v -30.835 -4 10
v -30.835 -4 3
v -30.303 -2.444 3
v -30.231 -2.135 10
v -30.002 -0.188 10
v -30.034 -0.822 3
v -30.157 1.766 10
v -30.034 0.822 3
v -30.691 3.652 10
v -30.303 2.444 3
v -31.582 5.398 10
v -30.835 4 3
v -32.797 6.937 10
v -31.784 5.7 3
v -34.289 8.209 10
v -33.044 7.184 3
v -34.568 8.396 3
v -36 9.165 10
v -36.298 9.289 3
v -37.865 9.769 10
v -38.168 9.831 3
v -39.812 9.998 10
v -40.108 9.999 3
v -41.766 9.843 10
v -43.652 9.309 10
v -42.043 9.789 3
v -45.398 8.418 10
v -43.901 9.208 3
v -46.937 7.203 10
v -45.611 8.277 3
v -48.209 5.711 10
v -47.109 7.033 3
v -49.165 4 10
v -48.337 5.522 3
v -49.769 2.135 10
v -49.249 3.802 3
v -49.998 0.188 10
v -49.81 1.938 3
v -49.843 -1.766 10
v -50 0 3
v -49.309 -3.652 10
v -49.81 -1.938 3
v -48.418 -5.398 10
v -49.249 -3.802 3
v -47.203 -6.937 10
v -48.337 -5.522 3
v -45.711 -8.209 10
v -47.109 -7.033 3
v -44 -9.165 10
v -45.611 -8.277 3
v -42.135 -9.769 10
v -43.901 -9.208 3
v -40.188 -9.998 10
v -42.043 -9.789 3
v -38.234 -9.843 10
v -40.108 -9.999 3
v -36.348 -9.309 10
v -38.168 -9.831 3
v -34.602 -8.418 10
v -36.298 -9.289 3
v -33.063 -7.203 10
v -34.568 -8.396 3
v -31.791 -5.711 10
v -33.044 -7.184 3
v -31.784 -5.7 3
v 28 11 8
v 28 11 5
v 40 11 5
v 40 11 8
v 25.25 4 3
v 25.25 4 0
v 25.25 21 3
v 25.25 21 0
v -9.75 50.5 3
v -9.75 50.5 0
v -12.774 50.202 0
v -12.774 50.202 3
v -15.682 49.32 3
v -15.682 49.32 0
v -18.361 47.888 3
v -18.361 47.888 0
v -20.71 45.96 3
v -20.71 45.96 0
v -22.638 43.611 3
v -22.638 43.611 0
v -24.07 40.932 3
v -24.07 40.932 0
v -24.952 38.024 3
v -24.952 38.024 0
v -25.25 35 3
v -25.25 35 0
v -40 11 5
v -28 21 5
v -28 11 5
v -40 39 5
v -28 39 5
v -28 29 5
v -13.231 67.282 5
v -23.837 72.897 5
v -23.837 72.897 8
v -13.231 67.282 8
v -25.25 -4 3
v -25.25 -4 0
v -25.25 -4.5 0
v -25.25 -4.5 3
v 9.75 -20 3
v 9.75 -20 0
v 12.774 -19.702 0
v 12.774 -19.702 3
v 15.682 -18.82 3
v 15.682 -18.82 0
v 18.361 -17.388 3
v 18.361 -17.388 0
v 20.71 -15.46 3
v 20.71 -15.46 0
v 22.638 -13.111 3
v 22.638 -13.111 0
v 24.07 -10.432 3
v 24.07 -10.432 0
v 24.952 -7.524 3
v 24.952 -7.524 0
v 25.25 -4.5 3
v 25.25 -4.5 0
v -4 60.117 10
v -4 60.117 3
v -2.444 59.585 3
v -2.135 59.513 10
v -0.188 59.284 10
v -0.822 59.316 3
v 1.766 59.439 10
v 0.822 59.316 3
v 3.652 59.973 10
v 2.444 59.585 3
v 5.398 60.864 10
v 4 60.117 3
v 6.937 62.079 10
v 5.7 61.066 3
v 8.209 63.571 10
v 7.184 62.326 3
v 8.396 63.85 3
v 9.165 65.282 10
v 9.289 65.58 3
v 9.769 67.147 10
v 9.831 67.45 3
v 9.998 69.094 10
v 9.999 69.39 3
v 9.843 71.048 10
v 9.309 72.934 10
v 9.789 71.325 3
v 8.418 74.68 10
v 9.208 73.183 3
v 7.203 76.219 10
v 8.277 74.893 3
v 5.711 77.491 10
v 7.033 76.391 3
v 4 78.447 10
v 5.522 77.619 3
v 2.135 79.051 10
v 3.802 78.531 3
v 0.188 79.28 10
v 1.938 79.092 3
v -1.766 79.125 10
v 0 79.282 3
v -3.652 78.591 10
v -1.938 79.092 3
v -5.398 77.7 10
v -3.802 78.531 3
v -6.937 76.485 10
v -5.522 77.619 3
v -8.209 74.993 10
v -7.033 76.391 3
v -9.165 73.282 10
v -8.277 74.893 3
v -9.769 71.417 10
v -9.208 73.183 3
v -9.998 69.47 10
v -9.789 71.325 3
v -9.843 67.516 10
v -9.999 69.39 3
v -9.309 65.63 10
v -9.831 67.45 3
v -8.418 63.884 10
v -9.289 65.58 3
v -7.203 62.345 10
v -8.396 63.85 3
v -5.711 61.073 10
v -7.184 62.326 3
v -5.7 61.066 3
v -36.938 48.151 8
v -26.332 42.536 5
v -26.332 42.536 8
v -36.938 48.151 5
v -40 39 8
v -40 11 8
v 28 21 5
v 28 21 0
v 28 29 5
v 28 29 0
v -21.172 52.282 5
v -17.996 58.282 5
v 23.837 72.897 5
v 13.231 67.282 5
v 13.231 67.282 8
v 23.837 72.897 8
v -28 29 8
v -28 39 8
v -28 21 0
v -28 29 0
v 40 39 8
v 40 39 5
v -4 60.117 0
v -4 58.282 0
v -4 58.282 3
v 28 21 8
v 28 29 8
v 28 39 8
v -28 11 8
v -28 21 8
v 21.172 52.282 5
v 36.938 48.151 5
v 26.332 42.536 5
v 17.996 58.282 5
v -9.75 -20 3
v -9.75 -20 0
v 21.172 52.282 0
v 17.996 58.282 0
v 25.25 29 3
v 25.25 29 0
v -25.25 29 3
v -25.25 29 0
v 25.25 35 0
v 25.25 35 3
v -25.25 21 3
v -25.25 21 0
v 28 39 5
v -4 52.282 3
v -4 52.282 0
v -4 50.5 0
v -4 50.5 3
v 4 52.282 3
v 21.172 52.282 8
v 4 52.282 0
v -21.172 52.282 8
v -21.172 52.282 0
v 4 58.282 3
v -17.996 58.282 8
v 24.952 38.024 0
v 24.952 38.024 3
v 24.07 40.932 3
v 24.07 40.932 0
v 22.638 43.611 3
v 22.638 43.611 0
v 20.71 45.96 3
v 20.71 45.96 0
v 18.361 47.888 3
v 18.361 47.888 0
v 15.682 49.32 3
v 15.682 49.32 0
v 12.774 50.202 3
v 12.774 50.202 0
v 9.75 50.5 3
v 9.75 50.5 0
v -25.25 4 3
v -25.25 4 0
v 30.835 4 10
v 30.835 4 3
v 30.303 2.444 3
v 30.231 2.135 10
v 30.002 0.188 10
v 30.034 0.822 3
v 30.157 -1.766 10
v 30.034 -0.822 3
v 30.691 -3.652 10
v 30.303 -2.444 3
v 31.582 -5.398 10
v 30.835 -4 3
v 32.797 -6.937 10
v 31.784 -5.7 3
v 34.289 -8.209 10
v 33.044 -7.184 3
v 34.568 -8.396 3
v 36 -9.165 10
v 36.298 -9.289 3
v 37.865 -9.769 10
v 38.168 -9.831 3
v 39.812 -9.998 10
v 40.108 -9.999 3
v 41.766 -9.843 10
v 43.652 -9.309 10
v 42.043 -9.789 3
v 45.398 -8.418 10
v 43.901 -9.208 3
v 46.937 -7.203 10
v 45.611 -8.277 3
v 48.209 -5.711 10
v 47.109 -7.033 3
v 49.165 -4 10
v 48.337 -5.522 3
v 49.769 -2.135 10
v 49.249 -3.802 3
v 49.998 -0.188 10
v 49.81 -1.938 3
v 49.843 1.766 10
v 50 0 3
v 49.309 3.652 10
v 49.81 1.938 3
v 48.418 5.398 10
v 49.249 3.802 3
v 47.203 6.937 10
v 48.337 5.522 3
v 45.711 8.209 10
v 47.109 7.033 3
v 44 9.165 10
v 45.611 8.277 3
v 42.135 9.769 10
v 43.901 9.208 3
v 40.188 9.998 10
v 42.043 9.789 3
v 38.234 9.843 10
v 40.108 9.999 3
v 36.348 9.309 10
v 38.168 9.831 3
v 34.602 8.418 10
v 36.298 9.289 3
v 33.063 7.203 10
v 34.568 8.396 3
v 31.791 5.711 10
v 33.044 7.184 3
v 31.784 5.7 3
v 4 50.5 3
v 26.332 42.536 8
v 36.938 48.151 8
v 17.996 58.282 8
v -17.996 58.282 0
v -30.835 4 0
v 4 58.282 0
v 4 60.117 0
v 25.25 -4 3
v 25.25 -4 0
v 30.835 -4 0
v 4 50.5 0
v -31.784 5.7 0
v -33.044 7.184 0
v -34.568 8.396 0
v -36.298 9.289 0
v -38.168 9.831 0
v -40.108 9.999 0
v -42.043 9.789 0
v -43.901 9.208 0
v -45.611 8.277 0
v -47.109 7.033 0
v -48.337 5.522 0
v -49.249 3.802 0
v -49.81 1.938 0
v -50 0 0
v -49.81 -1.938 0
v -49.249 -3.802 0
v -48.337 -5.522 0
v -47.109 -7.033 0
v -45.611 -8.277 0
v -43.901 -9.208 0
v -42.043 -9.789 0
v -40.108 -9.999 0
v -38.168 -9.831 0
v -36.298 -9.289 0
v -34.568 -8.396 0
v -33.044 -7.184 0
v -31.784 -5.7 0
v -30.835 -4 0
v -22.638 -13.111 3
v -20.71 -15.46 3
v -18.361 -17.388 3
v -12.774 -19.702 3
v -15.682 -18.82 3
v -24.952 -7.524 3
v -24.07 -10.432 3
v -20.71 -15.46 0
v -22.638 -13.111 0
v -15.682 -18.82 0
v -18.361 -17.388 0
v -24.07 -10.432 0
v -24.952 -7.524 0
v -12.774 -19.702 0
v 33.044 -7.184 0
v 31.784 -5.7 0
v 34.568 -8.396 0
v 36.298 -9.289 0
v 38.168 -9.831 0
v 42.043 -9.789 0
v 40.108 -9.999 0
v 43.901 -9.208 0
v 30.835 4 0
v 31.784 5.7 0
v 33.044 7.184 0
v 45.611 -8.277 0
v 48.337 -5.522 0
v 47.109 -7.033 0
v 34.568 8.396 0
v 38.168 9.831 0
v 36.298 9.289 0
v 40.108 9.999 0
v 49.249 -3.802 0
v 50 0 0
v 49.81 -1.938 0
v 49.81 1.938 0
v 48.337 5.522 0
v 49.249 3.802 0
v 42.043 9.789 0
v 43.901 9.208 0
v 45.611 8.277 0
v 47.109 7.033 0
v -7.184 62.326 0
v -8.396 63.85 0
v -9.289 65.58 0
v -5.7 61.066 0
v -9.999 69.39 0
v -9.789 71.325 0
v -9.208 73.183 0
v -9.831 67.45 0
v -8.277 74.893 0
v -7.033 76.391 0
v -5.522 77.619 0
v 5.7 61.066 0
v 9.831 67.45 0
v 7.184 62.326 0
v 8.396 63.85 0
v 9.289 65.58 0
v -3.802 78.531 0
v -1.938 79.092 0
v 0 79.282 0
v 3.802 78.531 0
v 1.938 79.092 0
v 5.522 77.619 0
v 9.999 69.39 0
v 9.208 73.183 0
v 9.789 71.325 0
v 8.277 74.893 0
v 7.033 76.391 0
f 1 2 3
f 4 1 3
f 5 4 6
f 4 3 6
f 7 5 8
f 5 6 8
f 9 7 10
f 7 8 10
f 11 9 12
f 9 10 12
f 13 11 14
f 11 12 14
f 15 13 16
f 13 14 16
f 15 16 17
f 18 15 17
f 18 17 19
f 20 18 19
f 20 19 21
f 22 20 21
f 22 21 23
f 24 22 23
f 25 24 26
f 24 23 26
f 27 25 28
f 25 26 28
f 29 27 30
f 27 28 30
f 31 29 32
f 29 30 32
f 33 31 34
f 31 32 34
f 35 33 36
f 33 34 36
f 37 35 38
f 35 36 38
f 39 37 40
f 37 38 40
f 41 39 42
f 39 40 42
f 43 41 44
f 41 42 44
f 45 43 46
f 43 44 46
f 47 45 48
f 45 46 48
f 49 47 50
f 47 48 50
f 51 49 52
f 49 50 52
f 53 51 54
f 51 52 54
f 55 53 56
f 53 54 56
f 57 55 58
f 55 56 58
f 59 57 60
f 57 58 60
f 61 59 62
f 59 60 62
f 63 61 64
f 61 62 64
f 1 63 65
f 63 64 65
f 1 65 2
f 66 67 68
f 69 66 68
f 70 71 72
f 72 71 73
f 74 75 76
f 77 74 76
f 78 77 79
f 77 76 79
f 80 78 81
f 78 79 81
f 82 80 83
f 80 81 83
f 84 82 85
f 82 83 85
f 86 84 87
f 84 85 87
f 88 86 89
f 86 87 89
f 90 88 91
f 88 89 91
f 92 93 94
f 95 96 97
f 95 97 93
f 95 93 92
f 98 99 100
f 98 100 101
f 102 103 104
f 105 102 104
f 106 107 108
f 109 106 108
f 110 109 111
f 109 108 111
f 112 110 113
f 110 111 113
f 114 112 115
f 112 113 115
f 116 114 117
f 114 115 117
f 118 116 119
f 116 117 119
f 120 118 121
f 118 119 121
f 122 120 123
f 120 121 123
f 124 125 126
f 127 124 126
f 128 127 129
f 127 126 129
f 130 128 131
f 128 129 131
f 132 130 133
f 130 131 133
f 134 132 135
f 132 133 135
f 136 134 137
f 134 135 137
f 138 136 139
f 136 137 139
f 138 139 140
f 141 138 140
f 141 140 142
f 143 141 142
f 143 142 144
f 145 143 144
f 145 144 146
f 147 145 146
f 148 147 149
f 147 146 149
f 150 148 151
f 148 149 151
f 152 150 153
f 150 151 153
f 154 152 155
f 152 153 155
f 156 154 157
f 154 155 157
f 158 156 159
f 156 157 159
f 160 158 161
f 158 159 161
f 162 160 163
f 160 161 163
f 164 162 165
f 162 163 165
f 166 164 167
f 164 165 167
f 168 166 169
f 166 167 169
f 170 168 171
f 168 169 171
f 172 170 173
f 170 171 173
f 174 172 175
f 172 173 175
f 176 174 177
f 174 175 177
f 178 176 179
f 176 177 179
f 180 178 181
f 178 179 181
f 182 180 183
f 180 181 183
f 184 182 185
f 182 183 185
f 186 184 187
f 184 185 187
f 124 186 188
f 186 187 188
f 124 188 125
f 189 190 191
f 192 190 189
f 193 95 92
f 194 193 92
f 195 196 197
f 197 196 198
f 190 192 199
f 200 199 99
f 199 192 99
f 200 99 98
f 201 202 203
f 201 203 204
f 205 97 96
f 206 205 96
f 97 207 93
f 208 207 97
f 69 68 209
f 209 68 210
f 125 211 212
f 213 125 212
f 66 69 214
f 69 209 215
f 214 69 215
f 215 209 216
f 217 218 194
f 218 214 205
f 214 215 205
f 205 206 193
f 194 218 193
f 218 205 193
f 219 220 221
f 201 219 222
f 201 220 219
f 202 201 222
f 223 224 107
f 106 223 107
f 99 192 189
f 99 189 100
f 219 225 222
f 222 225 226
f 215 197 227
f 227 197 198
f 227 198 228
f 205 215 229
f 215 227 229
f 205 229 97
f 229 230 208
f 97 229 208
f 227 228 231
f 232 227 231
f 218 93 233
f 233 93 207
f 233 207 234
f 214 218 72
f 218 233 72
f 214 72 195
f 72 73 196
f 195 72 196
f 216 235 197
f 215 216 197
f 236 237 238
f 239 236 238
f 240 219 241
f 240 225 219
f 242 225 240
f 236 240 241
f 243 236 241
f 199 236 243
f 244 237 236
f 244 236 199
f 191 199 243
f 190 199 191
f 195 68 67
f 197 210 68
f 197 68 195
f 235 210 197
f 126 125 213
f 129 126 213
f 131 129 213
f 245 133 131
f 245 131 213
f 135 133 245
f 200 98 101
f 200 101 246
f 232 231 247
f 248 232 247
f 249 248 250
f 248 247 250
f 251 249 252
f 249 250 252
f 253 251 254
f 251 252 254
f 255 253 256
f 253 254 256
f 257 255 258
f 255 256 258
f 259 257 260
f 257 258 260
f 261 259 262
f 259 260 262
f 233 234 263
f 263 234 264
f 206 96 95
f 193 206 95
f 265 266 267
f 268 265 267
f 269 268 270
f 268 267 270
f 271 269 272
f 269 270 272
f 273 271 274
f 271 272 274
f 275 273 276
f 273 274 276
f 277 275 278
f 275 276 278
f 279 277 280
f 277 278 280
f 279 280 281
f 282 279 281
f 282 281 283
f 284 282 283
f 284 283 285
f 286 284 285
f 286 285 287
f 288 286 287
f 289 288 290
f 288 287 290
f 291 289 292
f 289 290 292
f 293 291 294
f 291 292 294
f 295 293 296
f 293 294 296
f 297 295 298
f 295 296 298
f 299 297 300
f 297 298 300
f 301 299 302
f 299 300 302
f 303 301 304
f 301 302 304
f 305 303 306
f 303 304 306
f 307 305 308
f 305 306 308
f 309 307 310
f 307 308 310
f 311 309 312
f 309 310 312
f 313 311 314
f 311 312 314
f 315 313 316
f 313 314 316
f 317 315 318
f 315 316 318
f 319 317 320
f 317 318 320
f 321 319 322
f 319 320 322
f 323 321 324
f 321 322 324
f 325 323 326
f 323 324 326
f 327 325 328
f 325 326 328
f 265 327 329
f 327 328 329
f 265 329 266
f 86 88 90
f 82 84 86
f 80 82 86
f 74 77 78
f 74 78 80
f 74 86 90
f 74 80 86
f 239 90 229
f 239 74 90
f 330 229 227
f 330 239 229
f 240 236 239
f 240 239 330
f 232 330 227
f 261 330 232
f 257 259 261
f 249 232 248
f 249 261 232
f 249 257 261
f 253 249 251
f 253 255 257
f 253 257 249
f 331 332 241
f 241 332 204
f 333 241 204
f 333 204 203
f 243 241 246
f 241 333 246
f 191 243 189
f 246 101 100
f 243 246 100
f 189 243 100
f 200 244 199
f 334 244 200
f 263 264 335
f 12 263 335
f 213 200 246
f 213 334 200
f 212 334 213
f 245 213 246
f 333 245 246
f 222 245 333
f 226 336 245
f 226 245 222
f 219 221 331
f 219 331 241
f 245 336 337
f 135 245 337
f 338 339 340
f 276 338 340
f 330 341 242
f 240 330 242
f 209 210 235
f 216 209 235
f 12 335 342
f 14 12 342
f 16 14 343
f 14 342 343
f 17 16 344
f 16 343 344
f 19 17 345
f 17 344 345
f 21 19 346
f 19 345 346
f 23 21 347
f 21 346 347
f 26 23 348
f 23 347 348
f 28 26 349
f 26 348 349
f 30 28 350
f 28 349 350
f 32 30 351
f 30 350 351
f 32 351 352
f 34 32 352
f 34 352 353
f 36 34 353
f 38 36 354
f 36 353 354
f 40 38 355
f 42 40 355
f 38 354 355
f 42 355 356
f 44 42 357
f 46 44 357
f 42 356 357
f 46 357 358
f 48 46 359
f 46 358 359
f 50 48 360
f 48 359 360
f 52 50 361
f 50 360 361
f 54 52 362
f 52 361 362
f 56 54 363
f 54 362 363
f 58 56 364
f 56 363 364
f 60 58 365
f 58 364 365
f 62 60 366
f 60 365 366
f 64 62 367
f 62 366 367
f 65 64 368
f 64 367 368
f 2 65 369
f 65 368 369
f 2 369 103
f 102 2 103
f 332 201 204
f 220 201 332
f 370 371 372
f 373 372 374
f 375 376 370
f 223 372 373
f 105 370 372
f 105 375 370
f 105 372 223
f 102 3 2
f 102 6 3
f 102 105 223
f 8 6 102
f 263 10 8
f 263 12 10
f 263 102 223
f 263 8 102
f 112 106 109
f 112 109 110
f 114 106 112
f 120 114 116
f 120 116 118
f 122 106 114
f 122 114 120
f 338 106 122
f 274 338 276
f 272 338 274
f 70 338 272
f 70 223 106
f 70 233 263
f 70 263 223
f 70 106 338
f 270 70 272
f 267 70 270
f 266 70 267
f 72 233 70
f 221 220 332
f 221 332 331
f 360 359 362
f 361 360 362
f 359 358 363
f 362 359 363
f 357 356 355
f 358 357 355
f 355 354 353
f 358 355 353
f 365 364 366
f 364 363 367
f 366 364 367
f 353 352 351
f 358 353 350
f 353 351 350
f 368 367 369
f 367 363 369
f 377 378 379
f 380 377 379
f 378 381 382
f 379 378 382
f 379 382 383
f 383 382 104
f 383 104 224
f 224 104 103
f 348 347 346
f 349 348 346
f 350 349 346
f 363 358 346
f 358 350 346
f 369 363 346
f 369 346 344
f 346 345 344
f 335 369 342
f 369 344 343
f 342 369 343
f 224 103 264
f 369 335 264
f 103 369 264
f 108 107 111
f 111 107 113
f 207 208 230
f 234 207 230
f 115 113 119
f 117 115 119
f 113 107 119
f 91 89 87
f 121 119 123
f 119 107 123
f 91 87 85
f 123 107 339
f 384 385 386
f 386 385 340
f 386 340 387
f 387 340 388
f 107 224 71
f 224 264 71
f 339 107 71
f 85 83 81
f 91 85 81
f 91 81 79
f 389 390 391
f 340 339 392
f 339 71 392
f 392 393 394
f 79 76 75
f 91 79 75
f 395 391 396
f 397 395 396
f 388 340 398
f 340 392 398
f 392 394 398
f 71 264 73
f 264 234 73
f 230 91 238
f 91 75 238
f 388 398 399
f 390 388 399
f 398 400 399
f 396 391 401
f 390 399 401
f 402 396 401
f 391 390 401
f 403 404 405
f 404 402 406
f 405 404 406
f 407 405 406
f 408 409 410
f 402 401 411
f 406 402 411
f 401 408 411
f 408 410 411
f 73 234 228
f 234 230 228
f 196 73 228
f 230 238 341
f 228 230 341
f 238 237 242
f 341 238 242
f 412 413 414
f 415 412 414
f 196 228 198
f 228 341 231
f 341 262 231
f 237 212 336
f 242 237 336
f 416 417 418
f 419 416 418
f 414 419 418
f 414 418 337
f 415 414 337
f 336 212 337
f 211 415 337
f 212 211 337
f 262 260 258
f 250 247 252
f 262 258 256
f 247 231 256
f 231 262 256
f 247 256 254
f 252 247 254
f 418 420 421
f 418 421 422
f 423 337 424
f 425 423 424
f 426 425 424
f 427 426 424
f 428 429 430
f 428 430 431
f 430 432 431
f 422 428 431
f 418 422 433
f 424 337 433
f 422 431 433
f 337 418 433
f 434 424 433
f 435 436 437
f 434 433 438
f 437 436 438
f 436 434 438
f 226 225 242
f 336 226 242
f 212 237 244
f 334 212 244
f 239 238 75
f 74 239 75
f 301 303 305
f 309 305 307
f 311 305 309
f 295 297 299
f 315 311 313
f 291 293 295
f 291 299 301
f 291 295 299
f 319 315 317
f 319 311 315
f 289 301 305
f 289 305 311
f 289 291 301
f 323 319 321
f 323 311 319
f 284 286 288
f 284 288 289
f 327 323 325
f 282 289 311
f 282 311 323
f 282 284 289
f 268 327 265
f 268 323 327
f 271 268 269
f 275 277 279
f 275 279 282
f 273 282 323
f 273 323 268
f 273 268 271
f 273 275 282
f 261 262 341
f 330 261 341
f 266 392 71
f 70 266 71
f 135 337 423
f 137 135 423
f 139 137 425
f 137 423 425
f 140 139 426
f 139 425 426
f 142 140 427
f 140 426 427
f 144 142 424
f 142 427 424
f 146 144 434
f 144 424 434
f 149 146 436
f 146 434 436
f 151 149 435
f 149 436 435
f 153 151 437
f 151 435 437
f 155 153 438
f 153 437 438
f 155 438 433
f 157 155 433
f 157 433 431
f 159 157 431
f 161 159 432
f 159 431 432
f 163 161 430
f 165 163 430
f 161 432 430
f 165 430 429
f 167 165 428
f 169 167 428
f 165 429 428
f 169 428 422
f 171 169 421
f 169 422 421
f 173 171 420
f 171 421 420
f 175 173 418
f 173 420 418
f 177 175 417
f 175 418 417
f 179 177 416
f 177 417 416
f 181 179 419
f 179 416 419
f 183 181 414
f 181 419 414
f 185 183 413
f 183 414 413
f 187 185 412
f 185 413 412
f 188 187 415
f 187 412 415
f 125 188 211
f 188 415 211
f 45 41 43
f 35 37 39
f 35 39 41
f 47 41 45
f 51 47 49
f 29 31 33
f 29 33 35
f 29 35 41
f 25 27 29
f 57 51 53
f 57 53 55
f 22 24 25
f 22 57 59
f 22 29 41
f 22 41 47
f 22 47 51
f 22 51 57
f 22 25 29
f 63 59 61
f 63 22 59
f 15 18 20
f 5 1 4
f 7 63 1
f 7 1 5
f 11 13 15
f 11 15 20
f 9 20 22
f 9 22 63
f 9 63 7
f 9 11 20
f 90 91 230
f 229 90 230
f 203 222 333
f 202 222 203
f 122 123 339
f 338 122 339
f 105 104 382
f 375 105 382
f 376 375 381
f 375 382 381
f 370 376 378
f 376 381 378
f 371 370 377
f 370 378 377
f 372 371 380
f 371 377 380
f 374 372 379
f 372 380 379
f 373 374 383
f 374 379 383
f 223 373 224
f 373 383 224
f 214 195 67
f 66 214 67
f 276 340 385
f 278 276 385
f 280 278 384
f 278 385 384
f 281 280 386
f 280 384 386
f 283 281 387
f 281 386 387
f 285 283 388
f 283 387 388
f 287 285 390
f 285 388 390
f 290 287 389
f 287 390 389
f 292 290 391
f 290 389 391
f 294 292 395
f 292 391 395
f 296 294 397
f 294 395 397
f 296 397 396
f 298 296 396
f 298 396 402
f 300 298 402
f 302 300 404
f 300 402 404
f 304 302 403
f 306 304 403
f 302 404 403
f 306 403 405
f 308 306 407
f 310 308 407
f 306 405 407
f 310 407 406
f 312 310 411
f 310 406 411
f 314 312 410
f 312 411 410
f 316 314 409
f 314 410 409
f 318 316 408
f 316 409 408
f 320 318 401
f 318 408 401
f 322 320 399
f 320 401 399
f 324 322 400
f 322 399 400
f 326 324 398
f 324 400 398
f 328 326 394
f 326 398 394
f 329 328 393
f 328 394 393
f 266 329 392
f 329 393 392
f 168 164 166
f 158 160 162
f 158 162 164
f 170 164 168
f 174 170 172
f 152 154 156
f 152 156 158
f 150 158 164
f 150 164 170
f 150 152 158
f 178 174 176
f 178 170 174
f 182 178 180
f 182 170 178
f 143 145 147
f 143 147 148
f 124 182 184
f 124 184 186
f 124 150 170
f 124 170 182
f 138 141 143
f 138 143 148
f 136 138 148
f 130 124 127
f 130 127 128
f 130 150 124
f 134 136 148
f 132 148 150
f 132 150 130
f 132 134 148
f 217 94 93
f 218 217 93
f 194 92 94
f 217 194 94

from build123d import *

# Parameters (mm, degrees)
BOSS_EXTRU_1_DEPTH      = 3
ESQUISSE2_R             = 10
BOSS_EXTRU_2_DEPTH      = 7
BOSS_EXTRU_3_DEPTH      = 5
ESQUISSE4_W             = 12
ESQUISSE4_H             = 28
ENL_V_MAT_EXTRU_1_DEPTH = 5


# Read off the part's stored shape, not the designer's step: Boss.-Extru.1
with BuildPart() as part:
    # Boss.-Extru.1 outline → Boss.-Extru.1 (new body)
    with BuildSketch(Plane.XY):
        with BuildLine():
            ThreePointArc((-25.25, -4.5), (-20.710155108, -15.460155108), (-9.75, -20))
            Line((-9.75, -20), (9.75, -20))
            ThreePointArc((9.75, -20), (20.710155108, -15.460155108), (25.25, -4.5))
            Line((25.25, -4.5), (25.25, -4))
            Line((25.25, -4), (30.83484861, -4))
            ThreePointArc((30.83484861, -4), (50, 0), (30.83484861, 4))
            Line((30.83484861, 4), (25.25, 4))
            Line((25.25, 4), (25.25, 21))
            Line((25.25, 21), (28, 21))
            Line((28, 21), (28, 11))
            Line((28, 11), (40, 11))
            Line((40, 11), (40, 39))
            Line((40, 39), (28, 39))
            Line((28, 39), (28, 29))
            Line((28, 29), (25.25, 29))
            Line((25.25, 29), (25.25, 35))
            ThreePointArc((25.25, 35), (20.710155108, 45.960155108), (9.75, 50.5))
            Line((9.75, 50.5), (4, 50.5))
            Line((4, 50.5), (4, 52.282032303))
            Line((4, 52.282032303), (21.172408726, 52.282032303))
            Line((21.172408726, 52.282032303), (26.332088428, 42.535970645))
            Line((26.332088428, 42.535970645), (36.937543424, 48.15062329))
            Line((36.937543424, 48.15062329), (23.836687252, 72.896684948))
            Line((23.836687252, 72.896684948), (13.231232256, 67.282032303))
            Line((13.231232256, 67.282032303), (17.995938138, 58.282032303))
            Line((17.995938138, 58.282032303), (4, 58.282032303))
            Line((4, 58.282032303), (4, 60.116880913))
            ThreePointArc((4, 60.116880913), (0, 79.282032303), (-4, 60.116880913))
            Line((-4, 60.116880913), (-4, 58.282032303))
            Line((-4, 58.282032303), (-17.995938138, 58.282032303))
            Line((-17.995938138, 58.282032303), (-13.231232256, 67.282032303))
            Line((-13.231232256, 67.282032303), (-23.836687252, 72.896684948))
            Line((-23.836687252, 72.896684948), (-36.937543424, 48.15062329))
            Line((-36.937543424, 48.15062329), (-26.332088428, 42.535970645))
            Line((-26.332088428, 42.535970645), (-21.172408726, 52.282032303))
            Line((-21.172408726, 52.282032303), (-4, 52.282032303))
            Line((-4, 52.282032303), (-4, 50.5))
            Line((-4, 50.5), (-9.75, 50.5))
            ThreePointArc((-9.75, 50.5), (-20.710155108, 45.960155108), (-25.25, 35))
            Line((-25.25, 35), (-25.25, 29))
            Line((-25.25, 29), (-28, 29))
            Line((-28, 29), (-28, 39))
            Line((-28, 39), (-40, 39))
            Line((-40, 39), (-40, 11))
            Line((-40, 11), (-28, 11))
            Line((-28, 11), (-28, 21))
            Line((-28, 21), (-25.25, 21))
            Line((-25.25, 21), (-25.25, 4))
            Line((-25.25, 4), (-30.83484861, 4))
            ThreePointArc((-30.83484861, 4), (-50, 0), (-30.83484861, -4))
            Line((-30.83484861, -4), (-25.25, -4))
            Line((-25.25, -4), (-25.25, -4.5))
        make_face()
    extrude(amount=BOSS_EXTRU_1_DEPTH)

    # Esquisse2 → Boss.-Extru.2 (add)
    with BuildSketch(Plane.XY.offset(3)):
        with Locations(Location((-40, 0, 0), (0, 0, 336.421821522))):
            Circle(ESQUISSE2_R)
        with Locations(Location((40, 0, 0), (0, 0, 156.421821522))):
            Circle(ESQUISSE2_R)
        with Locations(Location((0, 69.282032303, 0), (0, 0, 246.421821522))):
            Circle(ESQUISSE2_R)
    extrude(amount=BOSS_EXTRU_2_DEPTH)

    # Esquisse3 → Boss.-Extru.3 (add)
    with BuildSketch(Plane.XY.offset(3)):
        Polygon((23.836687252, 72.896684948), (36.937543424, 48.15062329), (26.332088428, 42.535970645), (21.172408726, 52.282032303), (-21.172408726, 52.282032303), (-26.332088428, 42.535970645), (-36.937543424, 48.15062329), (-23.836687252, 72.896684948), (-13.231232256, 67.282032303), (-17.995938138, 58.282032303), (17.995938138, 58.282032303), (13.231232256, 67.282032303), align=None)
        Polygon((28, 39), (40, 39), (40, 11), (28, 11), (28, 21), (-28, 21), (-28, 11), (-40, 11), (-40, 39), (-28, 39), (-28, 29), (28, 29), align=None)
    extrude(amount=BOSS_EXTRU_3_DEPTH)

    # Esquisse4 → Enlèv. mat.-Extru.1 (cut)
    with BuildSketch(Plane(origin=(0, 0, 0), x_dir=(-1, 0, 0), z_dir=(0, 0, -1))):
        with Locations((-34, 25)):
            Rectangle(ESQUISSE4_W, ESQUISSE4_H)
        Polygon((-36.937543424, 48.15062329), (-26.332088428, 42.535970645), (-13.231232256, 67.282032303), (-23.836687252, 72.896684948), align=None)
        Polygon((13.231232256, 67.282032303), (23.836687252, 72.896684948), (36.937543424, 48.15062329), (26.332088428, 42.535970645), align=None)
        with Locations((34, 25)):
            Rectangle(ESQUISSE4_W, ESQUISSE4_H)
    extrude(amount=-ENL_V_MAT_EXTRU_1_DEPTH, mode=Mode.SUBTRACT)


solid = part.part
